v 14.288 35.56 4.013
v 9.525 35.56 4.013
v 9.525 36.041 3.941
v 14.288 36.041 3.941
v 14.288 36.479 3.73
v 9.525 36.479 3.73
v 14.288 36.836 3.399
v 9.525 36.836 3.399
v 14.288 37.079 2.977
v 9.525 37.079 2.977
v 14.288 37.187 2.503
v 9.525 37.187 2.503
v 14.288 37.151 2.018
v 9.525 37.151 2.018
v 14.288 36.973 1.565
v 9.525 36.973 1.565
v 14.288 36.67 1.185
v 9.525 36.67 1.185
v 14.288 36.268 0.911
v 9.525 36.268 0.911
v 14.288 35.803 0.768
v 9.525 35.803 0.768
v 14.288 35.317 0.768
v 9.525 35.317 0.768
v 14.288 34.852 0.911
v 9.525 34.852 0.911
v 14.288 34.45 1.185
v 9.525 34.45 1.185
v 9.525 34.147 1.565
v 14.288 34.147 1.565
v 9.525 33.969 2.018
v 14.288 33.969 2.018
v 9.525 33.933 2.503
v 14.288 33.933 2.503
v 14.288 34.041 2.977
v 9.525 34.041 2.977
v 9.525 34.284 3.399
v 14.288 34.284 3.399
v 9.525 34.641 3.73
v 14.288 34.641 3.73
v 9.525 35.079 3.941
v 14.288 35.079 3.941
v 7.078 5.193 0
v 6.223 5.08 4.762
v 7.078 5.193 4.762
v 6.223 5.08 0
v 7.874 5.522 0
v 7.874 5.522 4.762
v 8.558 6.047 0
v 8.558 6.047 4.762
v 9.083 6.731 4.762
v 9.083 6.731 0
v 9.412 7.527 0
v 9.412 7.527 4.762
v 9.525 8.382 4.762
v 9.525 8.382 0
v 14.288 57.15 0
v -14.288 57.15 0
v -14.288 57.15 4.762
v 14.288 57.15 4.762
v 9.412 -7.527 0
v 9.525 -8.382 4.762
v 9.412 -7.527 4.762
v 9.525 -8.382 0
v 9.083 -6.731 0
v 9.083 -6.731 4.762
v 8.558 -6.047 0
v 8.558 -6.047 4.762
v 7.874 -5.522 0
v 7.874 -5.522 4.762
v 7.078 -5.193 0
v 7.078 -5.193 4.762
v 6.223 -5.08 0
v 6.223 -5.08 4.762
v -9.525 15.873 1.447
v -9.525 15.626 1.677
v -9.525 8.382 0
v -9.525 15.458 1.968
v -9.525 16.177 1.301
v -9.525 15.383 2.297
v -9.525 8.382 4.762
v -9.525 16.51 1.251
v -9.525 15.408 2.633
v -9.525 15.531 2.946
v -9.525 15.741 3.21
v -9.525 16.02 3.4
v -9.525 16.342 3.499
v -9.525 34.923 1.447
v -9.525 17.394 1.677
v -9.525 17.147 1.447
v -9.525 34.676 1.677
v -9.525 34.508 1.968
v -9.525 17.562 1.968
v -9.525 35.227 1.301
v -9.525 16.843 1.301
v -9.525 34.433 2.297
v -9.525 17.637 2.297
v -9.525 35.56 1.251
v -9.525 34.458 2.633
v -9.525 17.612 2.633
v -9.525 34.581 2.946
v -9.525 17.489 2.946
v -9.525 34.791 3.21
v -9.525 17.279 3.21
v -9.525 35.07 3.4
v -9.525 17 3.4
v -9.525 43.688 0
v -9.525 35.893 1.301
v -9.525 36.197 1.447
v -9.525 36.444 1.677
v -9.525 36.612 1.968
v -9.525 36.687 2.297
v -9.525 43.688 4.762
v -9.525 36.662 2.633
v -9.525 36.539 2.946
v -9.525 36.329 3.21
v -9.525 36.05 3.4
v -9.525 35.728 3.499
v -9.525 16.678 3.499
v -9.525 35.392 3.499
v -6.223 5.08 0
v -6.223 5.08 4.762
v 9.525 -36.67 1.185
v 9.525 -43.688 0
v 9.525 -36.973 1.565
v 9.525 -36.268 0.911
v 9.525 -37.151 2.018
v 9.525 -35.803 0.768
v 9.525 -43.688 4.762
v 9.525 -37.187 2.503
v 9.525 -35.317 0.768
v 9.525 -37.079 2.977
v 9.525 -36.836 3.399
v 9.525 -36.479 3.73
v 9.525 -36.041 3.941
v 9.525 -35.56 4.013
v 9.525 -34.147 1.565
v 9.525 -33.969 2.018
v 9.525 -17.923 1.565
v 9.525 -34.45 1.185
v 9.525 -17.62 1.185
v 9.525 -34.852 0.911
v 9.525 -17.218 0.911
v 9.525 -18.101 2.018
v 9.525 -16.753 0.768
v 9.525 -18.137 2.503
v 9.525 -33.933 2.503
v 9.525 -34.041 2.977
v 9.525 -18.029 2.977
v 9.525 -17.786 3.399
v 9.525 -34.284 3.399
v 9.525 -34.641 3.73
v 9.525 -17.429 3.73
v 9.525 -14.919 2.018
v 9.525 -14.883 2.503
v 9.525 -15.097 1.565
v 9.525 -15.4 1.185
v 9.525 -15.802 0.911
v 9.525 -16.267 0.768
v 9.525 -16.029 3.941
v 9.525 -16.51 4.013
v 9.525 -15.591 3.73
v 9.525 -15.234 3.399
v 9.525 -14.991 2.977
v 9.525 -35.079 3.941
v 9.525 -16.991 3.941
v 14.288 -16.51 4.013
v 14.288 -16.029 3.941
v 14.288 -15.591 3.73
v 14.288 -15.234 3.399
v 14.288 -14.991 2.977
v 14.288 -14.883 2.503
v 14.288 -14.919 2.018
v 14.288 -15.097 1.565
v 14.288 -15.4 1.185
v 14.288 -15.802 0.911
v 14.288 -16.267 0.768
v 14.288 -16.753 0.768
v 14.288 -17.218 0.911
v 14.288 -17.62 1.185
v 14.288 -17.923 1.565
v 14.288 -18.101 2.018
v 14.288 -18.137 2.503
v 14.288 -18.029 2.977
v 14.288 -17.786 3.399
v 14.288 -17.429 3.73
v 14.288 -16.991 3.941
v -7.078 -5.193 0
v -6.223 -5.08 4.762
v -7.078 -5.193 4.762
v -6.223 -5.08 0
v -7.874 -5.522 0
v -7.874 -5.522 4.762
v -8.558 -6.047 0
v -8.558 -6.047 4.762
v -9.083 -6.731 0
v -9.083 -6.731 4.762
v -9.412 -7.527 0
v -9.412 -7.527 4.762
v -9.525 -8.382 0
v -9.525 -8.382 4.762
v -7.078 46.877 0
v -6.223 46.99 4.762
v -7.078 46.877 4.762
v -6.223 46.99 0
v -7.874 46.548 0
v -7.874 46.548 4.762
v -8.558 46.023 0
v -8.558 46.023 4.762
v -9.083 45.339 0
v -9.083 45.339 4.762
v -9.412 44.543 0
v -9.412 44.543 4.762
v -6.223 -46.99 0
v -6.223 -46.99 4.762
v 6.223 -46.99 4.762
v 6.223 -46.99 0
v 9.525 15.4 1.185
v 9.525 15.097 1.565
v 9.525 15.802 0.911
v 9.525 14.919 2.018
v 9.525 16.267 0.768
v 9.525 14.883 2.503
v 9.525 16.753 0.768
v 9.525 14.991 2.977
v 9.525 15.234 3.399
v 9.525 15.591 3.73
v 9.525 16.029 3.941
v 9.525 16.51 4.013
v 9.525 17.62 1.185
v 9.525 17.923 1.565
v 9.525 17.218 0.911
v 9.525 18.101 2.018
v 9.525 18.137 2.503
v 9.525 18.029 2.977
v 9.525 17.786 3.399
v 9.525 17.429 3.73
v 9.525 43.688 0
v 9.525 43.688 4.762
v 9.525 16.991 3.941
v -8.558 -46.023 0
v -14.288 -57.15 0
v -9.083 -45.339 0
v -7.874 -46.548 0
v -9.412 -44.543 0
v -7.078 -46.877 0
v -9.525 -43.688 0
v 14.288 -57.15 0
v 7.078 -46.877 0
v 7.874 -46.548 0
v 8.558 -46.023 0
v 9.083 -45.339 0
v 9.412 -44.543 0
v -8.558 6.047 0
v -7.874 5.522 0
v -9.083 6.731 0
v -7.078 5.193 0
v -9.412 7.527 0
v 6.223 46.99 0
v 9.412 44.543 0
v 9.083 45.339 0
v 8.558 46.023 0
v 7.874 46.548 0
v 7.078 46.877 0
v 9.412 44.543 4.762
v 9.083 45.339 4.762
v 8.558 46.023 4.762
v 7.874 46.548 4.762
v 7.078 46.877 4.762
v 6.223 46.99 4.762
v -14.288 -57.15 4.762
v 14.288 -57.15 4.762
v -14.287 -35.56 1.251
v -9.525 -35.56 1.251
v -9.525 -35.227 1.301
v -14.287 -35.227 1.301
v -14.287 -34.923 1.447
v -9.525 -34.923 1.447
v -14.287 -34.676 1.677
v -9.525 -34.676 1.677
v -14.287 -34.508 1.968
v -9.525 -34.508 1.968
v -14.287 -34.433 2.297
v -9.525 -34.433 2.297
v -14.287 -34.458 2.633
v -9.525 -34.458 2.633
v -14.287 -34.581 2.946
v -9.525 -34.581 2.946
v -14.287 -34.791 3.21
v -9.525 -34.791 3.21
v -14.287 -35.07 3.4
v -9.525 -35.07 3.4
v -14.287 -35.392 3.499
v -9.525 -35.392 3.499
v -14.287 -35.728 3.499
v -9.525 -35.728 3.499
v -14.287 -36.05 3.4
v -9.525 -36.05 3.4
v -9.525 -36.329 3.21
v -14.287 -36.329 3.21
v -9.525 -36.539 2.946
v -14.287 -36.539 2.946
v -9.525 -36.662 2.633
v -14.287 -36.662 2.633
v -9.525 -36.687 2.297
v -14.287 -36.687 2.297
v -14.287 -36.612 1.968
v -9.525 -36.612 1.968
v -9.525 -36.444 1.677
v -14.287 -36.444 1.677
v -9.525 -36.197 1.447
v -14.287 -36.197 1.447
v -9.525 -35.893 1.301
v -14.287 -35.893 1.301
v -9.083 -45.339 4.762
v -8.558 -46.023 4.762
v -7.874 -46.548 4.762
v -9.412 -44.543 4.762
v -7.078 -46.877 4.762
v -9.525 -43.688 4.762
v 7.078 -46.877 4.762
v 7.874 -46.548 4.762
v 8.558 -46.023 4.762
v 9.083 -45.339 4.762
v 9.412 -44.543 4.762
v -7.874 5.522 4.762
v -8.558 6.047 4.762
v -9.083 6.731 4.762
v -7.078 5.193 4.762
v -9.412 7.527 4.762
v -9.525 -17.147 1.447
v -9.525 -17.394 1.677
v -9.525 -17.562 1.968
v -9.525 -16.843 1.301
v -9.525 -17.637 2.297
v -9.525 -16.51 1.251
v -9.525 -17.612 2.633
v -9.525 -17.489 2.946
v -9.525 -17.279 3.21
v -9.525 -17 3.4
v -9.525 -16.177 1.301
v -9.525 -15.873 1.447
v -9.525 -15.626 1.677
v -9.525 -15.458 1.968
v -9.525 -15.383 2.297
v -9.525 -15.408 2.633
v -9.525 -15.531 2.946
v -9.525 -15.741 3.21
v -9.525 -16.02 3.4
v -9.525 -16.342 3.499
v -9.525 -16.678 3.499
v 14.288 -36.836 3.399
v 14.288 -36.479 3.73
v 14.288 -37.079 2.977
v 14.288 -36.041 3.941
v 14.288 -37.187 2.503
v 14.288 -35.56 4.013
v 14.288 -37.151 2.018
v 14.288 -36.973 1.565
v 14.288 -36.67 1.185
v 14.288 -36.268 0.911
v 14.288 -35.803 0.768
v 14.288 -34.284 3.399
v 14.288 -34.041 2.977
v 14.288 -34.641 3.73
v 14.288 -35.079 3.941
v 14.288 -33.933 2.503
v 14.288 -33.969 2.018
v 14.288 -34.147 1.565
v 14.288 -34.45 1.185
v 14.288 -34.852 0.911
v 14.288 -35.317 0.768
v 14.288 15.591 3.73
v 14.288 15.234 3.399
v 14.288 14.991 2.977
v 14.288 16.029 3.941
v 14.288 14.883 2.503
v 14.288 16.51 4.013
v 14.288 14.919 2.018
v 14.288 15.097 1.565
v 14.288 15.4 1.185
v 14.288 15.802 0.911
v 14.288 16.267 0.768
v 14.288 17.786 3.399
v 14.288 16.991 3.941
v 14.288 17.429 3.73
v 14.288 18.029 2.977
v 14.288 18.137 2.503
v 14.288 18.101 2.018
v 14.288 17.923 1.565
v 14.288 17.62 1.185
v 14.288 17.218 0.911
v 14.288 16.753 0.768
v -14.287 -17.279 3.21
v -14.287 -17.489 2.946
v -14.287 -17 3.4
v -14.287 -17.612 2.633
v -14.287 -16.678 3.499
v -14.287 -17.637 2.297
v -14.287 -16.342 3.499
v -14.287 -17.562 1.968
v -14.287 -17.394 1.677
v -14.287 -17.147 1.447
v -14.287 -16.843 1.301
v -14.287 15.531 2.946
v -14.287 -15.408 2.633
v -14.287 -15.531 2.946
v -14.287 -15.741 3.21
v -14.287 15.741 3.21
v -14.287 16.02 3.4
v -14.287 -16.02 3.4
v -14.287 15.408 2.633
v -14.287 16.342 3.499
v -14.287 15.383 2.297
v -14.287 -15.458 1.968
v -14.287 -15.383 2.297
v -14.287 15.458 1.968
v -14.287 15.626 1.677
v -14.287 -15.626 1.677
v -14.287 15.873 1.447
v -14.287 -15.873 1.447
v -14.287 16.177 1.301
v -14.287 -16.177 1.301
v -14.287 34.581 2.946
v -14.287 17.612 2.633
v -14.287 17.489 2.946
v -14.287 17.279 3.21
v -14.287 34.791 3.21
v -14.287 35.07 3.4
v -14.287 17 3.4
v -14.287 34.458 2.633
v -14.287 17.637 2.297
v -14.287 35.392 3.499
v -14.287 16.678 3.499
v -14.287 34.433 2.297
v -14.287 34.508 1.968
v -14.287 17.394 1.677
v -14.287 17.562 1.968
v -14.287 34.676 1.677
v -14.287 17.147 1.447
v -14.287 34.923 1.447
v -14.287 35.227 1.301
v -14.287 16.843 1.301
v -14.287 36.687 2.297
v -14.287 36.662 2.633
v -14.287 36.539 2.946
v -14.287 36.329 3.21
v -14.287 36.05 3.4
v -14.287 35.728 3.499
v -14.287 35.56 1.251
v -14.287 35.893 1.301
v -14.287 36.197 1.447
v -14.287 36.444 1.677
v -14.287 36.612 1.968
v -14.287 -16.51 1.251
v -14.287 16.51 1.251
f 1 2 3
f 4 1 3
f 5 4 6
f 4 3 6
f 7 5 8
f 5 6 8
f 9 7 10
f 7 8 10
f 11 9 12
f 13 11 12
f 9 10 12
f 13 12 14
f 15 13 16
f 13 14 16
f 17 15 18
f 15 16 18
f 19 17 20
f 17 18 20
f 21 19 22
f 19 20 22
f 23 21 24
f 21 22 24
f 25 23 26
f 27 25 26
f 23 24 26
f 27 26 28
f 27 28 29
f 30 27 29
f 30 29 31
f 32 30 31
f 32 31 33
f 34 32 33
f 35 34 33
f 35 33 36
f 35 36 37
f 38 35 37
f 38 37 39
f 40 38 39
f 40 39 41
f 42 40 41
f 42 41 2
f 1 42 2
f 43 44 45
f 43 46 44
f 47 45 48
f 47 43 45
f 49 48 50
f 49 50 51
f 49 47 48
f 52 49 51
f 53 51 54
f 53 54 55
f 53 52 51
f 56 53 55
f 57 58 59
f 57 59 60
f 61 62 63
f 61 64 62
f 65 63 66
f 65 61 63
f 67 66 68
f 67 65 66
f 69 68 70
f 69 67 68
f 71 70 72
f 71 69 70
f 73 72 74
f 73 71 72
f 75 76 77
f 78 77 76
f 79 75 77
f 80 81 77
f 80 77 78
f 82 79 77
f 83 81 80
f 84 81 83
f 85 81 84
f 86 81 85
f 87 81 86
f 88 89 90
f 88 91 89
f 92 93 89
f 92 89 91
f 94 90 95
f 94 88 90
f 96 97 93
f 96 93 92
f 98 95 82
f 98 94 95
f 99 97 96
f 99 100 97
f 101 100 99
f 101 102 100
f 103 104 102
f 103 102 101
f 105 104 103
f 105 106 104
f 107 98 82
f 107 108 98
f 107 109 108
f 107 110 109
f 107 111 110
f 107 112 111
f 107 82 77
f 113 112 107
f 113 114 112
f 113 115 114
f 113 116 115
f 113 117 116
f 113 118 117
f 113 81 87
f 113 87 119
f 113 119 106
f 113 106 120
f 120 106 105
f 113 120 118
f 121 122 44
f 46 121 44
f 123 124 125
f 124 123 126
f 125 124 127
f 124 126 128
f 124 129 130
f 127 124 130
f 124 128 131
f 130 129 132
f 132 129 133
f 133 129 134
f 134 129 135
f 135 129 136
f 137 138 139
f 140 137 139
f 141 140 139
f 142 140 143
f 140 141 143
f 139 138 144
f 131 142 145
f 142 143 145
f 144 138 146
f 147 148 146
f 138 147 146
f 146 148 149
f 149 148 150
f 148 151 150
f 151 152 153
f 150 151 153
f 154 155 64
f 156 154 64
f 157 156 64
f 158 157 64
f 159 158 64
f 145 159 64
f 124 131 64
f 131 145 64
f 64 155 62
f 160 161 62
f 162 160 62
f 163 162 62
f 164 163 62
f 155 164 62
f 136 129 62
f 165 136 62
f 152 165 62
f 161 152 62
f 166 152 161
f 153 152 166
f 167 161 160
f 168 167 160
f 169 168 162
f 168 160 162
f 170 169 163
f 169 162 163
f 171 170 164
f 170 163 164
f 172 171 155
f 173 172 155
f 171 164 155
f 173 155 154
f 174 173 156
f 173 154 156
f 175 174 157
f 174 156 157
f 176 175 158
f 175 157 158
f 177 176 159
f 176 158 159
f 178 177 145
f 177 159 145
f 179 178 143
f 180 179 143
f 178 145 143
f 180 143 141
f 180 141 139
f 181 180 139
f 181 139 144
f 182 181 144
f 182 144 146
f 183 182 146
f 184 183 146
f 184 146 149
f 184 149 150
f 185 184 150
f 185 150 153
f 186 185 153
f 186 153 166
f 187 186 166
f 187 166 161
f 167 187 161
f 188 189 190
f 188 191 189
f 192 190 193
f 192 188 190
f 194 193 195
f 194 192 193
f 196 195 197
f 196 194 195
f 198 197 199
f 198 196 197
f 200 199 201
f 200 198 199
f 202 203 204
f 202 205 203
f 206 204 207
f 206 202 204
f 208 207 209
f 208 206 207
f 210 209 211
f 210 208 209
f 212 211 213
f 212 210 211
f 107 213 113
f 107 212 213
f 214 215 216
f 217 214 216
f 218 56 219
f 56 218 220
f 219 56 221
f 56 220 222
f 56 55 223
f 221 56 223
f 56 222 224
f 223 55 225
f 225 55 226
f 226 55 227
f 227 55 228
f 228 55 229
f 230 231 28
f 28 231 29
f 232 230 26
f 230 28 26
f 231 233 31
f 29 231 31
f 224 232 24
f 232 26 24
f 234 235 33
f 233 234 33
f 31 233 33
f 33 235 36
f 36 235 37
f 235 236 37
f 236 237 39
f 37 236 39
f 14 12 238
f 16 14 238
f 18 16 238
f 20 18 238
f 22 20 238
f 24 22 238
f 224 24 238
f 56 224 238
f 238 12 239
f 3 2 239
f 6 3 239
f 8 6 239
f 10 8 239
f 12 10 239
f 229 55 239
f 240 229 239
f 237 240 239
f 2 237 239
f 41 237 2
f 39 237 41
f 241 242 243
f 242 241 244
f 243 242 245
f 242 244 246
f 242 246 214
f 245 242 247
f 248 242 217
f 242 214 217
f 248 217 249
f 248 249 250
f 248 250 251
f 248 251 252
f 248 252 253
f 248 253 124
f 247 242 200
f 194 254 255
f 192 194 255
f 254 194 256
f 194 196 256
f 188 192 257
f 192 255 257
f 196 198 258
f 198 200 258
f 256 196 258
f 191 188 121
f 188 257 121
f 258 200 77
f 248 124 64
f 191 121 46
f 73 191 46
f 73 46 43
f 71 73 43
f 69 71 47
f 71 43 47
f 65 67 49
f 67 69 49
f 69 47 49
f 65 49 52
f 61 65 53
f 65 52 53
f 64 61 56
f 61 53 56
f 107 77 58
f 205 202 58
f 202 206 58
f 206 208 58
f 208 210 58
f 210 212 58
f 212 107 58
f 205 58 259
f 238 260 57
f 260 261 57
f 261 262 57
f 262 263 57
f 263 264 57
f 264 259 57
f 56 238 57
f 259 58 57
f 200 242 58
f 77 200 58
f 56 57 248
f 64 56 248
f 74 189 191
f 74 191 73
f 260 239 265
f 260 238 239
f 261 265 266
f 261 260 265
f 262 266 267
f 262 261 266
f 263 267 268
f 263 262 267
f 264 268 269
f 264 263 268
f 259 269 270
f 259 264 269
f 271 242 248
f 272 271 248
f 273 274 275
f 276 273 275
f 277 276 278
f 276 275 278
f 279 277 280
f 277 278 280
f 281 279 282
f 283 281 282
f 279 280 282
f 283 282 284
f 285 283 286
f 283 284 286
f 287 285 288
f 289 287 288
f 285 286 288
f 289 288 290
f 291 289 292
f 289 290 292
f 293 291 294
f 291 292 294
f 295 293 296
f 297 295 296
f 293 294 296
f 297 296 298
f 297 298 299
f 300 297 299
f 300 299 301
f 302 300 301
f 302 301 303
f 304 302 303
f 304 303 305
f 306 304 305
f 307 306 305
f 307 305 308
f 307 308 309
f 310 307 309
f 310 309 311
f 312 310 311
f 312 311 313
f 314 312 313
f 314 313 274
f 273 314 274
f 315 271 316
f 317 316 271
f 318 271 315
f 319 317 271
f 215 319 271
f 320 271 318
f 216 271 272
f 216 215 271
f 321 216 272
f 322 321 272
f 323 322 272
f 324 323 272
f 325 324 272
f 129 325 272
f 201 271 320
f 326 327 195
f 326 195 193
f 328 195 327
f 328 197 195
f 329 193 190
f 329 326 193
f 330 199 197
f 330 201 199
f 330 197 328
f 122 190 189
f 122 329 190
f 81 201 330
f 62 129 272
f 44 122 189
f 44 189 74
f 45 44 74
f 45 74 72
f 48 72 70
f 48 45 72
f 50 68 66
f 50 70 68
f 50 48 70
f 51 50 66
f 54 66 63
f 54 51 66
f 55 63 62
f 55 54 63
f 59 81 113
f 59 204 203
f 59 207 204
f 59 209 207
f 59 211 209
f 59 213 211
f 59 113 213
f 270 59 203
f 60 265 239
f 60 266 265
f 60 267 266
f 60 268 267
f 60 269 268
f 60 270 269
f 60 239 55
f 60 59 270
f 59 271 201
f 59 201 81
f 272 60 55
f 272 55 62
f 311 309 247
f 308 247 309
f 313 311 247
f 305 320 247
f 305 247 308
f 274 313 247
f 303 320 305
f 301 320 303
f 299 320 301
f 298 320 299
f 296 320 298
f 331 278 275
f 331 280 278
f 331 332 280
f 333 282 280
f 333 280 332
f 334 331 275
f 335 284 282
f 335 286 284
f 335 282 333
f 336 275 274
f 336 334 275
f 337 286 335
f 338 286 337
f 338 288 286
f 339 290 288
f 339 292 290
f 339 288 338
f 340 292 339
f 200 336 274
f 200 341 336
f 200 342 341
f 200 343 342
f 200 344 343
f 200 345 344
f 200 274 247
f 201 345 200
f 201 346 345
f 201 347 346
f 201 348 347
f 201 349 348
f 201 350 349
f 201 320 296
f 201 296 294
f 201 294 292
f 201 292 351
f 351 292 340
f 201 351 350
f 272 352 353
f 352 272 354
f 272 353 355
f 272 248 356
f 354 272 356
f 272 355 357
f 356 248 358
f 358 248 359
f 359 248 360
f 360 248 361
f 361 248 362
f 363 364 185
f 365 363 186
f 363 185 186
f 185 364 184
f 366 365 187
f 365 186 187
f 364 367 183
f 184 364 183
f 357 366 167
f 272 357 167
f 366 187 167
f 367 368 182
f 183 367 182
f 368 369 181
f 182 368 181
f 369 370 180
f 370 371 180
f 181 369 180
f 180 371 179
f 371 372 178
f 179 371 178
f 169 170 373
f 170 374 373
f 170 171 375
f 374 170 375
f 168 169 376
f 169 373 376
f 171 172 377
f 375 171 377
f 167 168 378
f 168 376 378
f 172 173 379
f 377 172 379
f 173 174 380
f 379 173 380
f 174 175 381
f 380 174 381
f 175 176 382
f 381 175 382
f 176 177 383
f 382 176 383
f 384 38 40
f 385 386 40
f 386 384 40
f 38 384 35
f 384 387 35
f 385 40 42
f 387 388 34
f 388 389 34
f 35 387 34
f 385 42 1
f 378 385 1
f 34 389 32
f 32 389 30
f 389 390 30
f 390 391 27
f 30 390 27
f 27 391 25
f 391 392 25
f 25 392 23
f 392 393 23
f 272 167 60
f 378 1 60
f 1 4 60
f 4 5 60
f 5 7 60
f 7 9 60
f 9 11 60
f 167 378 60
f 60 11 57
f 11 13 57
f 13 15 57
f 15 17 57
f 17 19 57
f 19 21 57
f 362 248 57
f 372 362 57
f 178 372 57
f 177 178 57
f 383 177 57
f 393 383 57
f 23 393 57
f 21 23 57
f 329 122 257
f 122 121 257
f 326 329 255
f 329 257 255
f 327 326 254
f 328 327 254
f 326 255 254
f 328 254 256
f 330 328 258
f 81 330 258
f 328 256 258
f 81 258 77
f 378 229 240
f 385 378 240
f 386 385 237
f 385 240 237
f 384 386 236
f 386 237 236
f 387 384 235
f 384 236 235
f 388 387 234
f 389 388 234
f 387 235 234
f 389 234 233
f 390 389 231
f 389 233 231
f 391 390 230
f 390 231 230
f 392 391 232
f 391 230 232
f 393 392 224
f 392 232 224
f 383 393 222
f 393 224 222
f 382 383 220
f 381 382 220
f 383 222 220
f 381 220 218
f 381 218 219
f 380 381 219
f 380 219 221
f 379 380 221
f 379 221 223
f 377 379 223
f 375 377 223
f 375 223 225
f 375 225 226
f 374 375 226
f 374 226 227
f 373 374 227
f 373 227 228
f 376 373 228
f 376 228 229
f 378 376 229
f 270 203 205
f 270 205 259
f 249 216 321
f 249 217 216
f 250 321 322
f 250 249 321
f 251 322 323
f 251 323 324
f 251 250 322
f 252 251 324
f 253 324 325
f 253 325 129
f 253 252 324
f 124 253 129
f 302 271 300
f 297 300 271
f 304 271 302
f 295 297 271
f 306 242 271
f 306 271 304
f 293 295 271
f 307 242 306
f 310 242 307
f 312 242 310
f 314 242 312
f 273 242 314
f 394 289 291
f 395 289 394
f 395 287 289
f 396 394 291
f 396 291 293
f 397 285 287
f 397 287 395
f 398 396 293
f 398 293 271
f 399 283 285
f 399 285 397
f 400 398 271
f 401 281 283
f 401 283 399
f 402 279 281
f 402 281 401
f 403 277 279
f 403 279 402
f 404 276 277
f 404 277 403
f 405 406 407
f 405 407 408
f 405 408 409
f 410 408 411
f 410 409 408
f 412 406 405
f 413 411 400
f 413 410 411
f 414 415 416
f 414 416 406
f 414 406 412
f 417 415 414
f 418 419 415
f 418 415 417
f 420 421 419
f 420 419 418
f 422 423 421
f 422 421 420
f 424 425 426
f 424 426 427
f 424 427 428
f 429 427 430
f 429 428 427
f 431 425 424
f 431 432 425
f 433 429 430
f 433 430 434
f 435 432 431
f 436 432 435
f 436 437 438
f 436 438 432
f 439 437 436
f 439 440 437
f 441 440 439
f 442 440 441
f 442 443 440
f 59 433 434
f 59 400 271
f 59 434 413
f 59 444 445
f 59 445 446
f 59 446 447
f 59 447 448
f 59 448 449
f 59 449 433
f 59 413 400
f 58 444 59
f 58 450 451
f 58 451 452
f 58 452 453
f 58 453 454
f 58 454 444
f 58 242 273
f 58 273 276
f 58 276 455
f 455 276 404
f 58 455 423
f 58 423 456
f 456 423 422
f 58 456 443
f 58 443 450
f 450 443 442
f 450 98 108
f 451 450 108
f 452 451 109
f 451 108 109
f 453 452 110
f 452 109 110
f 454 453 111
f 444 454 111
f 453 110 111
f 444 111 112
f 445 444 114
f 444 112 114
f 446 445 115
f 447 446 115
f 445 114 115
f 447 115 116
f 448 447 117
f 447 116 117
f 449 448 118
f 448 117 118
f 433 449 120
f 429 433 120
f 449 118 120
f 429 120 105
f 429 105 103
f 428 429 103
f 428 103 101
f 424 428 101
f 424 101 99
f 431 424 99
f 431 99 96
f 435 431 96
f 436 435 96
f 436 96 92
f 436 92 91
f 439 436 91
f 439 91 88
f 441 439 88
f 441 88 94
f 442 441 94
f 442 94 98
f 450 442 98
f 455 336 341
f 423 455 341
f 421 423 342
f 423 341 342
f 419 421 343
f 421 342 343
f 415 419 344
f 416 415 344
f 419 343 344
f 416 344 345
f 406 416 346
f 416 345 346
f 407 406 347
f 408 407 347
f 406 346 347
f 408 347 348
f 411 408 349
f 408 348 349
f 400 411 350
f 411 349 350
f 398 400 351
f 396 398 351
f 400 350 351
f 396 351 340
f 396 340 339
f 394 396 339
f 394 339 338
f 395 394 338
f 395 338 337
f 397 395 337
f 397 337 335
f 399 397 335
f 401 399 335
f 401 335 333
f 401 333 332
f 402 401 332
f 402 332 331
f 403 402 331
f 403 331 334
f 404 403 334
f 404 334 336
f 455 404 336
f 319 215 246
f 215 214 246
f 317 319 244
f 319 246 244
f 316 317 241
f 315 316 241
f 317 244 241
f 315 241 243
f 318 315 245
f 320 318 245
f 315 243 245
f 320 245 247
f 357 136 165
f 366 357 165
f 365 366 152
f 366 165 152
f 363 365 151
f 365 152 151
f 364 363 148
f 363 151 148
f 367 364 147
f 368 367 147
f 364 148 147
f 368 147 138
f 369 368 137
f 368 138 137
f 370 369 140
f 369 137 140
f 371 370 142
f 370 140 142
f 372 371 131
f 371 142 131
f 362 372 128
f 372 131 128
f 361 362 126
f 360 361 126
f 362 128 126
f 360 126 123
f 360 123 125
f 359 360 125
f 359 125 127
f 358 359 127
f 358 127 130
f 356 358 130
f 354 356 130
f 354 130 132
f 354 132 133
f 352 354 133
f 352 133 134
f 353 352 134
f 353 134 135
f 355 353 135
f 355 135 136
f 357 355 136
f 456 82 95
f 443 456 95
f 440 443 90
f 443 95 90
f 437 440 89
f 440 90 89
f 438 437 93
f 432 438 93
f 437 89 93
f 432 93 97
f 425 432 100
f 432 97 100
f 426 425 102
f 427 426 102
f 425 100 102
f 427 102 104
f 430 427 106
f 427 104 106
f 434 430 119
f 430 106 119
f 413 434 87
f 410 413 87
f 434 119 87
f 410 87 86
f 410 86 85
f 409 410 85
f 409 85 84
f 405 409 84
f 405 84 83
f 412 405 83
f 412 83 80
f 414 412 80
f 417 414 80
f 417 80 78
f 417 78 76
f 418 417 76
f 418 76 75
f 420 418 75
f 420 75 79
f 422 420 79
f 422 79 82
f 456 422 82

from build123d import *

# Parameters (mm, degrees)
SKETCH1_W                 = 28.575
SKETCH1_H                 = 114.3
BOSS_EXTRUDE1_DEPTH       = 4.7625
SKETCH2_W                 = 19.05
SKETCH2_H                 = 41.91
CUT_EXTRUDE1_DEPTH        = 60.101070739
FILLET1_R                 = 3.302
F_4_CLEARANCE_HOLE1_D     = 3.2639
F_4_CLEARANCE_HOLE1_DEPTH = 4.7625
F_4_40_TAPPED_HOLE1_D     = 2.2606


with BuildPart() as part:
    # Sketch1 → Boss-Extrude1 (new body)
    with BuildSketch(Plane.XY):
        Rectangle(SKETCH1_W, SKETCH1_H)
    extrude(amount=BOSS_EXTRUDE1_DEPTH)

    # Sketch2 → Cut-Extrude1 (cut, through all)
    with BuildSketch(Plane.XY.offset(4.7625)):
        with Locations((0, 26.035)):
            Rectangle(SKETCH2_W, SKETCH2_H)
        with Locations((0, -26.035)):
            Rectangle(SKETCH2_W, SKETCH2_H)
    extrude(amount=-CUT_EXTRUDE1_DEPTH, mode=Mode.SUBTRACT)

    # Fillet1
    fillet1_edges = [part.edges().sort_by_distance(p)[0] for p in [
        (9.525, 46.99, 2.38125),
        (9.525, 5.08, 2.38125),
        (-9.525, 5.08, 2.38125),
        (-9.525, 46.99, 2.38125),
        (-9.525, -46.99, 2.38125),
        (-9.525, -5.08, 2.38125),
        (9.525, -5.08, 2.38125),
        (9.525, -46.99, 2.38125),
    ]]
    fillet(fillet1_edges, radius=FILLET1_R)

    # #4 Clearance Hole1
    with Locations(Plane(origin=(14.2875, 0, 0), x_dir=(0, 0, -1), z_dir=(1, 0, 0))):
        with Locations((-2.38125, 35.56), (-2.38125, 16.51), (-2.38125, -16.51), (-2.38125, -35.56)):
            Hole(F_4_CLEARANCE_HOLE1_D / 2, depth=F_4_CLEARANCE_HOLE1_DEPTH)

    # #4-40 Tapped Hole1 (through all)
    with Locations(Plane.ZY.offset(14.2875)):
        with Locations((2.38125, 16.51), (2.38125, 35.56), (2.38125, -16.51), (2.38125, -35.56)):
            Hole(F_4_40_TAPPED_HOLE1_D / 2)


solid = part.part
